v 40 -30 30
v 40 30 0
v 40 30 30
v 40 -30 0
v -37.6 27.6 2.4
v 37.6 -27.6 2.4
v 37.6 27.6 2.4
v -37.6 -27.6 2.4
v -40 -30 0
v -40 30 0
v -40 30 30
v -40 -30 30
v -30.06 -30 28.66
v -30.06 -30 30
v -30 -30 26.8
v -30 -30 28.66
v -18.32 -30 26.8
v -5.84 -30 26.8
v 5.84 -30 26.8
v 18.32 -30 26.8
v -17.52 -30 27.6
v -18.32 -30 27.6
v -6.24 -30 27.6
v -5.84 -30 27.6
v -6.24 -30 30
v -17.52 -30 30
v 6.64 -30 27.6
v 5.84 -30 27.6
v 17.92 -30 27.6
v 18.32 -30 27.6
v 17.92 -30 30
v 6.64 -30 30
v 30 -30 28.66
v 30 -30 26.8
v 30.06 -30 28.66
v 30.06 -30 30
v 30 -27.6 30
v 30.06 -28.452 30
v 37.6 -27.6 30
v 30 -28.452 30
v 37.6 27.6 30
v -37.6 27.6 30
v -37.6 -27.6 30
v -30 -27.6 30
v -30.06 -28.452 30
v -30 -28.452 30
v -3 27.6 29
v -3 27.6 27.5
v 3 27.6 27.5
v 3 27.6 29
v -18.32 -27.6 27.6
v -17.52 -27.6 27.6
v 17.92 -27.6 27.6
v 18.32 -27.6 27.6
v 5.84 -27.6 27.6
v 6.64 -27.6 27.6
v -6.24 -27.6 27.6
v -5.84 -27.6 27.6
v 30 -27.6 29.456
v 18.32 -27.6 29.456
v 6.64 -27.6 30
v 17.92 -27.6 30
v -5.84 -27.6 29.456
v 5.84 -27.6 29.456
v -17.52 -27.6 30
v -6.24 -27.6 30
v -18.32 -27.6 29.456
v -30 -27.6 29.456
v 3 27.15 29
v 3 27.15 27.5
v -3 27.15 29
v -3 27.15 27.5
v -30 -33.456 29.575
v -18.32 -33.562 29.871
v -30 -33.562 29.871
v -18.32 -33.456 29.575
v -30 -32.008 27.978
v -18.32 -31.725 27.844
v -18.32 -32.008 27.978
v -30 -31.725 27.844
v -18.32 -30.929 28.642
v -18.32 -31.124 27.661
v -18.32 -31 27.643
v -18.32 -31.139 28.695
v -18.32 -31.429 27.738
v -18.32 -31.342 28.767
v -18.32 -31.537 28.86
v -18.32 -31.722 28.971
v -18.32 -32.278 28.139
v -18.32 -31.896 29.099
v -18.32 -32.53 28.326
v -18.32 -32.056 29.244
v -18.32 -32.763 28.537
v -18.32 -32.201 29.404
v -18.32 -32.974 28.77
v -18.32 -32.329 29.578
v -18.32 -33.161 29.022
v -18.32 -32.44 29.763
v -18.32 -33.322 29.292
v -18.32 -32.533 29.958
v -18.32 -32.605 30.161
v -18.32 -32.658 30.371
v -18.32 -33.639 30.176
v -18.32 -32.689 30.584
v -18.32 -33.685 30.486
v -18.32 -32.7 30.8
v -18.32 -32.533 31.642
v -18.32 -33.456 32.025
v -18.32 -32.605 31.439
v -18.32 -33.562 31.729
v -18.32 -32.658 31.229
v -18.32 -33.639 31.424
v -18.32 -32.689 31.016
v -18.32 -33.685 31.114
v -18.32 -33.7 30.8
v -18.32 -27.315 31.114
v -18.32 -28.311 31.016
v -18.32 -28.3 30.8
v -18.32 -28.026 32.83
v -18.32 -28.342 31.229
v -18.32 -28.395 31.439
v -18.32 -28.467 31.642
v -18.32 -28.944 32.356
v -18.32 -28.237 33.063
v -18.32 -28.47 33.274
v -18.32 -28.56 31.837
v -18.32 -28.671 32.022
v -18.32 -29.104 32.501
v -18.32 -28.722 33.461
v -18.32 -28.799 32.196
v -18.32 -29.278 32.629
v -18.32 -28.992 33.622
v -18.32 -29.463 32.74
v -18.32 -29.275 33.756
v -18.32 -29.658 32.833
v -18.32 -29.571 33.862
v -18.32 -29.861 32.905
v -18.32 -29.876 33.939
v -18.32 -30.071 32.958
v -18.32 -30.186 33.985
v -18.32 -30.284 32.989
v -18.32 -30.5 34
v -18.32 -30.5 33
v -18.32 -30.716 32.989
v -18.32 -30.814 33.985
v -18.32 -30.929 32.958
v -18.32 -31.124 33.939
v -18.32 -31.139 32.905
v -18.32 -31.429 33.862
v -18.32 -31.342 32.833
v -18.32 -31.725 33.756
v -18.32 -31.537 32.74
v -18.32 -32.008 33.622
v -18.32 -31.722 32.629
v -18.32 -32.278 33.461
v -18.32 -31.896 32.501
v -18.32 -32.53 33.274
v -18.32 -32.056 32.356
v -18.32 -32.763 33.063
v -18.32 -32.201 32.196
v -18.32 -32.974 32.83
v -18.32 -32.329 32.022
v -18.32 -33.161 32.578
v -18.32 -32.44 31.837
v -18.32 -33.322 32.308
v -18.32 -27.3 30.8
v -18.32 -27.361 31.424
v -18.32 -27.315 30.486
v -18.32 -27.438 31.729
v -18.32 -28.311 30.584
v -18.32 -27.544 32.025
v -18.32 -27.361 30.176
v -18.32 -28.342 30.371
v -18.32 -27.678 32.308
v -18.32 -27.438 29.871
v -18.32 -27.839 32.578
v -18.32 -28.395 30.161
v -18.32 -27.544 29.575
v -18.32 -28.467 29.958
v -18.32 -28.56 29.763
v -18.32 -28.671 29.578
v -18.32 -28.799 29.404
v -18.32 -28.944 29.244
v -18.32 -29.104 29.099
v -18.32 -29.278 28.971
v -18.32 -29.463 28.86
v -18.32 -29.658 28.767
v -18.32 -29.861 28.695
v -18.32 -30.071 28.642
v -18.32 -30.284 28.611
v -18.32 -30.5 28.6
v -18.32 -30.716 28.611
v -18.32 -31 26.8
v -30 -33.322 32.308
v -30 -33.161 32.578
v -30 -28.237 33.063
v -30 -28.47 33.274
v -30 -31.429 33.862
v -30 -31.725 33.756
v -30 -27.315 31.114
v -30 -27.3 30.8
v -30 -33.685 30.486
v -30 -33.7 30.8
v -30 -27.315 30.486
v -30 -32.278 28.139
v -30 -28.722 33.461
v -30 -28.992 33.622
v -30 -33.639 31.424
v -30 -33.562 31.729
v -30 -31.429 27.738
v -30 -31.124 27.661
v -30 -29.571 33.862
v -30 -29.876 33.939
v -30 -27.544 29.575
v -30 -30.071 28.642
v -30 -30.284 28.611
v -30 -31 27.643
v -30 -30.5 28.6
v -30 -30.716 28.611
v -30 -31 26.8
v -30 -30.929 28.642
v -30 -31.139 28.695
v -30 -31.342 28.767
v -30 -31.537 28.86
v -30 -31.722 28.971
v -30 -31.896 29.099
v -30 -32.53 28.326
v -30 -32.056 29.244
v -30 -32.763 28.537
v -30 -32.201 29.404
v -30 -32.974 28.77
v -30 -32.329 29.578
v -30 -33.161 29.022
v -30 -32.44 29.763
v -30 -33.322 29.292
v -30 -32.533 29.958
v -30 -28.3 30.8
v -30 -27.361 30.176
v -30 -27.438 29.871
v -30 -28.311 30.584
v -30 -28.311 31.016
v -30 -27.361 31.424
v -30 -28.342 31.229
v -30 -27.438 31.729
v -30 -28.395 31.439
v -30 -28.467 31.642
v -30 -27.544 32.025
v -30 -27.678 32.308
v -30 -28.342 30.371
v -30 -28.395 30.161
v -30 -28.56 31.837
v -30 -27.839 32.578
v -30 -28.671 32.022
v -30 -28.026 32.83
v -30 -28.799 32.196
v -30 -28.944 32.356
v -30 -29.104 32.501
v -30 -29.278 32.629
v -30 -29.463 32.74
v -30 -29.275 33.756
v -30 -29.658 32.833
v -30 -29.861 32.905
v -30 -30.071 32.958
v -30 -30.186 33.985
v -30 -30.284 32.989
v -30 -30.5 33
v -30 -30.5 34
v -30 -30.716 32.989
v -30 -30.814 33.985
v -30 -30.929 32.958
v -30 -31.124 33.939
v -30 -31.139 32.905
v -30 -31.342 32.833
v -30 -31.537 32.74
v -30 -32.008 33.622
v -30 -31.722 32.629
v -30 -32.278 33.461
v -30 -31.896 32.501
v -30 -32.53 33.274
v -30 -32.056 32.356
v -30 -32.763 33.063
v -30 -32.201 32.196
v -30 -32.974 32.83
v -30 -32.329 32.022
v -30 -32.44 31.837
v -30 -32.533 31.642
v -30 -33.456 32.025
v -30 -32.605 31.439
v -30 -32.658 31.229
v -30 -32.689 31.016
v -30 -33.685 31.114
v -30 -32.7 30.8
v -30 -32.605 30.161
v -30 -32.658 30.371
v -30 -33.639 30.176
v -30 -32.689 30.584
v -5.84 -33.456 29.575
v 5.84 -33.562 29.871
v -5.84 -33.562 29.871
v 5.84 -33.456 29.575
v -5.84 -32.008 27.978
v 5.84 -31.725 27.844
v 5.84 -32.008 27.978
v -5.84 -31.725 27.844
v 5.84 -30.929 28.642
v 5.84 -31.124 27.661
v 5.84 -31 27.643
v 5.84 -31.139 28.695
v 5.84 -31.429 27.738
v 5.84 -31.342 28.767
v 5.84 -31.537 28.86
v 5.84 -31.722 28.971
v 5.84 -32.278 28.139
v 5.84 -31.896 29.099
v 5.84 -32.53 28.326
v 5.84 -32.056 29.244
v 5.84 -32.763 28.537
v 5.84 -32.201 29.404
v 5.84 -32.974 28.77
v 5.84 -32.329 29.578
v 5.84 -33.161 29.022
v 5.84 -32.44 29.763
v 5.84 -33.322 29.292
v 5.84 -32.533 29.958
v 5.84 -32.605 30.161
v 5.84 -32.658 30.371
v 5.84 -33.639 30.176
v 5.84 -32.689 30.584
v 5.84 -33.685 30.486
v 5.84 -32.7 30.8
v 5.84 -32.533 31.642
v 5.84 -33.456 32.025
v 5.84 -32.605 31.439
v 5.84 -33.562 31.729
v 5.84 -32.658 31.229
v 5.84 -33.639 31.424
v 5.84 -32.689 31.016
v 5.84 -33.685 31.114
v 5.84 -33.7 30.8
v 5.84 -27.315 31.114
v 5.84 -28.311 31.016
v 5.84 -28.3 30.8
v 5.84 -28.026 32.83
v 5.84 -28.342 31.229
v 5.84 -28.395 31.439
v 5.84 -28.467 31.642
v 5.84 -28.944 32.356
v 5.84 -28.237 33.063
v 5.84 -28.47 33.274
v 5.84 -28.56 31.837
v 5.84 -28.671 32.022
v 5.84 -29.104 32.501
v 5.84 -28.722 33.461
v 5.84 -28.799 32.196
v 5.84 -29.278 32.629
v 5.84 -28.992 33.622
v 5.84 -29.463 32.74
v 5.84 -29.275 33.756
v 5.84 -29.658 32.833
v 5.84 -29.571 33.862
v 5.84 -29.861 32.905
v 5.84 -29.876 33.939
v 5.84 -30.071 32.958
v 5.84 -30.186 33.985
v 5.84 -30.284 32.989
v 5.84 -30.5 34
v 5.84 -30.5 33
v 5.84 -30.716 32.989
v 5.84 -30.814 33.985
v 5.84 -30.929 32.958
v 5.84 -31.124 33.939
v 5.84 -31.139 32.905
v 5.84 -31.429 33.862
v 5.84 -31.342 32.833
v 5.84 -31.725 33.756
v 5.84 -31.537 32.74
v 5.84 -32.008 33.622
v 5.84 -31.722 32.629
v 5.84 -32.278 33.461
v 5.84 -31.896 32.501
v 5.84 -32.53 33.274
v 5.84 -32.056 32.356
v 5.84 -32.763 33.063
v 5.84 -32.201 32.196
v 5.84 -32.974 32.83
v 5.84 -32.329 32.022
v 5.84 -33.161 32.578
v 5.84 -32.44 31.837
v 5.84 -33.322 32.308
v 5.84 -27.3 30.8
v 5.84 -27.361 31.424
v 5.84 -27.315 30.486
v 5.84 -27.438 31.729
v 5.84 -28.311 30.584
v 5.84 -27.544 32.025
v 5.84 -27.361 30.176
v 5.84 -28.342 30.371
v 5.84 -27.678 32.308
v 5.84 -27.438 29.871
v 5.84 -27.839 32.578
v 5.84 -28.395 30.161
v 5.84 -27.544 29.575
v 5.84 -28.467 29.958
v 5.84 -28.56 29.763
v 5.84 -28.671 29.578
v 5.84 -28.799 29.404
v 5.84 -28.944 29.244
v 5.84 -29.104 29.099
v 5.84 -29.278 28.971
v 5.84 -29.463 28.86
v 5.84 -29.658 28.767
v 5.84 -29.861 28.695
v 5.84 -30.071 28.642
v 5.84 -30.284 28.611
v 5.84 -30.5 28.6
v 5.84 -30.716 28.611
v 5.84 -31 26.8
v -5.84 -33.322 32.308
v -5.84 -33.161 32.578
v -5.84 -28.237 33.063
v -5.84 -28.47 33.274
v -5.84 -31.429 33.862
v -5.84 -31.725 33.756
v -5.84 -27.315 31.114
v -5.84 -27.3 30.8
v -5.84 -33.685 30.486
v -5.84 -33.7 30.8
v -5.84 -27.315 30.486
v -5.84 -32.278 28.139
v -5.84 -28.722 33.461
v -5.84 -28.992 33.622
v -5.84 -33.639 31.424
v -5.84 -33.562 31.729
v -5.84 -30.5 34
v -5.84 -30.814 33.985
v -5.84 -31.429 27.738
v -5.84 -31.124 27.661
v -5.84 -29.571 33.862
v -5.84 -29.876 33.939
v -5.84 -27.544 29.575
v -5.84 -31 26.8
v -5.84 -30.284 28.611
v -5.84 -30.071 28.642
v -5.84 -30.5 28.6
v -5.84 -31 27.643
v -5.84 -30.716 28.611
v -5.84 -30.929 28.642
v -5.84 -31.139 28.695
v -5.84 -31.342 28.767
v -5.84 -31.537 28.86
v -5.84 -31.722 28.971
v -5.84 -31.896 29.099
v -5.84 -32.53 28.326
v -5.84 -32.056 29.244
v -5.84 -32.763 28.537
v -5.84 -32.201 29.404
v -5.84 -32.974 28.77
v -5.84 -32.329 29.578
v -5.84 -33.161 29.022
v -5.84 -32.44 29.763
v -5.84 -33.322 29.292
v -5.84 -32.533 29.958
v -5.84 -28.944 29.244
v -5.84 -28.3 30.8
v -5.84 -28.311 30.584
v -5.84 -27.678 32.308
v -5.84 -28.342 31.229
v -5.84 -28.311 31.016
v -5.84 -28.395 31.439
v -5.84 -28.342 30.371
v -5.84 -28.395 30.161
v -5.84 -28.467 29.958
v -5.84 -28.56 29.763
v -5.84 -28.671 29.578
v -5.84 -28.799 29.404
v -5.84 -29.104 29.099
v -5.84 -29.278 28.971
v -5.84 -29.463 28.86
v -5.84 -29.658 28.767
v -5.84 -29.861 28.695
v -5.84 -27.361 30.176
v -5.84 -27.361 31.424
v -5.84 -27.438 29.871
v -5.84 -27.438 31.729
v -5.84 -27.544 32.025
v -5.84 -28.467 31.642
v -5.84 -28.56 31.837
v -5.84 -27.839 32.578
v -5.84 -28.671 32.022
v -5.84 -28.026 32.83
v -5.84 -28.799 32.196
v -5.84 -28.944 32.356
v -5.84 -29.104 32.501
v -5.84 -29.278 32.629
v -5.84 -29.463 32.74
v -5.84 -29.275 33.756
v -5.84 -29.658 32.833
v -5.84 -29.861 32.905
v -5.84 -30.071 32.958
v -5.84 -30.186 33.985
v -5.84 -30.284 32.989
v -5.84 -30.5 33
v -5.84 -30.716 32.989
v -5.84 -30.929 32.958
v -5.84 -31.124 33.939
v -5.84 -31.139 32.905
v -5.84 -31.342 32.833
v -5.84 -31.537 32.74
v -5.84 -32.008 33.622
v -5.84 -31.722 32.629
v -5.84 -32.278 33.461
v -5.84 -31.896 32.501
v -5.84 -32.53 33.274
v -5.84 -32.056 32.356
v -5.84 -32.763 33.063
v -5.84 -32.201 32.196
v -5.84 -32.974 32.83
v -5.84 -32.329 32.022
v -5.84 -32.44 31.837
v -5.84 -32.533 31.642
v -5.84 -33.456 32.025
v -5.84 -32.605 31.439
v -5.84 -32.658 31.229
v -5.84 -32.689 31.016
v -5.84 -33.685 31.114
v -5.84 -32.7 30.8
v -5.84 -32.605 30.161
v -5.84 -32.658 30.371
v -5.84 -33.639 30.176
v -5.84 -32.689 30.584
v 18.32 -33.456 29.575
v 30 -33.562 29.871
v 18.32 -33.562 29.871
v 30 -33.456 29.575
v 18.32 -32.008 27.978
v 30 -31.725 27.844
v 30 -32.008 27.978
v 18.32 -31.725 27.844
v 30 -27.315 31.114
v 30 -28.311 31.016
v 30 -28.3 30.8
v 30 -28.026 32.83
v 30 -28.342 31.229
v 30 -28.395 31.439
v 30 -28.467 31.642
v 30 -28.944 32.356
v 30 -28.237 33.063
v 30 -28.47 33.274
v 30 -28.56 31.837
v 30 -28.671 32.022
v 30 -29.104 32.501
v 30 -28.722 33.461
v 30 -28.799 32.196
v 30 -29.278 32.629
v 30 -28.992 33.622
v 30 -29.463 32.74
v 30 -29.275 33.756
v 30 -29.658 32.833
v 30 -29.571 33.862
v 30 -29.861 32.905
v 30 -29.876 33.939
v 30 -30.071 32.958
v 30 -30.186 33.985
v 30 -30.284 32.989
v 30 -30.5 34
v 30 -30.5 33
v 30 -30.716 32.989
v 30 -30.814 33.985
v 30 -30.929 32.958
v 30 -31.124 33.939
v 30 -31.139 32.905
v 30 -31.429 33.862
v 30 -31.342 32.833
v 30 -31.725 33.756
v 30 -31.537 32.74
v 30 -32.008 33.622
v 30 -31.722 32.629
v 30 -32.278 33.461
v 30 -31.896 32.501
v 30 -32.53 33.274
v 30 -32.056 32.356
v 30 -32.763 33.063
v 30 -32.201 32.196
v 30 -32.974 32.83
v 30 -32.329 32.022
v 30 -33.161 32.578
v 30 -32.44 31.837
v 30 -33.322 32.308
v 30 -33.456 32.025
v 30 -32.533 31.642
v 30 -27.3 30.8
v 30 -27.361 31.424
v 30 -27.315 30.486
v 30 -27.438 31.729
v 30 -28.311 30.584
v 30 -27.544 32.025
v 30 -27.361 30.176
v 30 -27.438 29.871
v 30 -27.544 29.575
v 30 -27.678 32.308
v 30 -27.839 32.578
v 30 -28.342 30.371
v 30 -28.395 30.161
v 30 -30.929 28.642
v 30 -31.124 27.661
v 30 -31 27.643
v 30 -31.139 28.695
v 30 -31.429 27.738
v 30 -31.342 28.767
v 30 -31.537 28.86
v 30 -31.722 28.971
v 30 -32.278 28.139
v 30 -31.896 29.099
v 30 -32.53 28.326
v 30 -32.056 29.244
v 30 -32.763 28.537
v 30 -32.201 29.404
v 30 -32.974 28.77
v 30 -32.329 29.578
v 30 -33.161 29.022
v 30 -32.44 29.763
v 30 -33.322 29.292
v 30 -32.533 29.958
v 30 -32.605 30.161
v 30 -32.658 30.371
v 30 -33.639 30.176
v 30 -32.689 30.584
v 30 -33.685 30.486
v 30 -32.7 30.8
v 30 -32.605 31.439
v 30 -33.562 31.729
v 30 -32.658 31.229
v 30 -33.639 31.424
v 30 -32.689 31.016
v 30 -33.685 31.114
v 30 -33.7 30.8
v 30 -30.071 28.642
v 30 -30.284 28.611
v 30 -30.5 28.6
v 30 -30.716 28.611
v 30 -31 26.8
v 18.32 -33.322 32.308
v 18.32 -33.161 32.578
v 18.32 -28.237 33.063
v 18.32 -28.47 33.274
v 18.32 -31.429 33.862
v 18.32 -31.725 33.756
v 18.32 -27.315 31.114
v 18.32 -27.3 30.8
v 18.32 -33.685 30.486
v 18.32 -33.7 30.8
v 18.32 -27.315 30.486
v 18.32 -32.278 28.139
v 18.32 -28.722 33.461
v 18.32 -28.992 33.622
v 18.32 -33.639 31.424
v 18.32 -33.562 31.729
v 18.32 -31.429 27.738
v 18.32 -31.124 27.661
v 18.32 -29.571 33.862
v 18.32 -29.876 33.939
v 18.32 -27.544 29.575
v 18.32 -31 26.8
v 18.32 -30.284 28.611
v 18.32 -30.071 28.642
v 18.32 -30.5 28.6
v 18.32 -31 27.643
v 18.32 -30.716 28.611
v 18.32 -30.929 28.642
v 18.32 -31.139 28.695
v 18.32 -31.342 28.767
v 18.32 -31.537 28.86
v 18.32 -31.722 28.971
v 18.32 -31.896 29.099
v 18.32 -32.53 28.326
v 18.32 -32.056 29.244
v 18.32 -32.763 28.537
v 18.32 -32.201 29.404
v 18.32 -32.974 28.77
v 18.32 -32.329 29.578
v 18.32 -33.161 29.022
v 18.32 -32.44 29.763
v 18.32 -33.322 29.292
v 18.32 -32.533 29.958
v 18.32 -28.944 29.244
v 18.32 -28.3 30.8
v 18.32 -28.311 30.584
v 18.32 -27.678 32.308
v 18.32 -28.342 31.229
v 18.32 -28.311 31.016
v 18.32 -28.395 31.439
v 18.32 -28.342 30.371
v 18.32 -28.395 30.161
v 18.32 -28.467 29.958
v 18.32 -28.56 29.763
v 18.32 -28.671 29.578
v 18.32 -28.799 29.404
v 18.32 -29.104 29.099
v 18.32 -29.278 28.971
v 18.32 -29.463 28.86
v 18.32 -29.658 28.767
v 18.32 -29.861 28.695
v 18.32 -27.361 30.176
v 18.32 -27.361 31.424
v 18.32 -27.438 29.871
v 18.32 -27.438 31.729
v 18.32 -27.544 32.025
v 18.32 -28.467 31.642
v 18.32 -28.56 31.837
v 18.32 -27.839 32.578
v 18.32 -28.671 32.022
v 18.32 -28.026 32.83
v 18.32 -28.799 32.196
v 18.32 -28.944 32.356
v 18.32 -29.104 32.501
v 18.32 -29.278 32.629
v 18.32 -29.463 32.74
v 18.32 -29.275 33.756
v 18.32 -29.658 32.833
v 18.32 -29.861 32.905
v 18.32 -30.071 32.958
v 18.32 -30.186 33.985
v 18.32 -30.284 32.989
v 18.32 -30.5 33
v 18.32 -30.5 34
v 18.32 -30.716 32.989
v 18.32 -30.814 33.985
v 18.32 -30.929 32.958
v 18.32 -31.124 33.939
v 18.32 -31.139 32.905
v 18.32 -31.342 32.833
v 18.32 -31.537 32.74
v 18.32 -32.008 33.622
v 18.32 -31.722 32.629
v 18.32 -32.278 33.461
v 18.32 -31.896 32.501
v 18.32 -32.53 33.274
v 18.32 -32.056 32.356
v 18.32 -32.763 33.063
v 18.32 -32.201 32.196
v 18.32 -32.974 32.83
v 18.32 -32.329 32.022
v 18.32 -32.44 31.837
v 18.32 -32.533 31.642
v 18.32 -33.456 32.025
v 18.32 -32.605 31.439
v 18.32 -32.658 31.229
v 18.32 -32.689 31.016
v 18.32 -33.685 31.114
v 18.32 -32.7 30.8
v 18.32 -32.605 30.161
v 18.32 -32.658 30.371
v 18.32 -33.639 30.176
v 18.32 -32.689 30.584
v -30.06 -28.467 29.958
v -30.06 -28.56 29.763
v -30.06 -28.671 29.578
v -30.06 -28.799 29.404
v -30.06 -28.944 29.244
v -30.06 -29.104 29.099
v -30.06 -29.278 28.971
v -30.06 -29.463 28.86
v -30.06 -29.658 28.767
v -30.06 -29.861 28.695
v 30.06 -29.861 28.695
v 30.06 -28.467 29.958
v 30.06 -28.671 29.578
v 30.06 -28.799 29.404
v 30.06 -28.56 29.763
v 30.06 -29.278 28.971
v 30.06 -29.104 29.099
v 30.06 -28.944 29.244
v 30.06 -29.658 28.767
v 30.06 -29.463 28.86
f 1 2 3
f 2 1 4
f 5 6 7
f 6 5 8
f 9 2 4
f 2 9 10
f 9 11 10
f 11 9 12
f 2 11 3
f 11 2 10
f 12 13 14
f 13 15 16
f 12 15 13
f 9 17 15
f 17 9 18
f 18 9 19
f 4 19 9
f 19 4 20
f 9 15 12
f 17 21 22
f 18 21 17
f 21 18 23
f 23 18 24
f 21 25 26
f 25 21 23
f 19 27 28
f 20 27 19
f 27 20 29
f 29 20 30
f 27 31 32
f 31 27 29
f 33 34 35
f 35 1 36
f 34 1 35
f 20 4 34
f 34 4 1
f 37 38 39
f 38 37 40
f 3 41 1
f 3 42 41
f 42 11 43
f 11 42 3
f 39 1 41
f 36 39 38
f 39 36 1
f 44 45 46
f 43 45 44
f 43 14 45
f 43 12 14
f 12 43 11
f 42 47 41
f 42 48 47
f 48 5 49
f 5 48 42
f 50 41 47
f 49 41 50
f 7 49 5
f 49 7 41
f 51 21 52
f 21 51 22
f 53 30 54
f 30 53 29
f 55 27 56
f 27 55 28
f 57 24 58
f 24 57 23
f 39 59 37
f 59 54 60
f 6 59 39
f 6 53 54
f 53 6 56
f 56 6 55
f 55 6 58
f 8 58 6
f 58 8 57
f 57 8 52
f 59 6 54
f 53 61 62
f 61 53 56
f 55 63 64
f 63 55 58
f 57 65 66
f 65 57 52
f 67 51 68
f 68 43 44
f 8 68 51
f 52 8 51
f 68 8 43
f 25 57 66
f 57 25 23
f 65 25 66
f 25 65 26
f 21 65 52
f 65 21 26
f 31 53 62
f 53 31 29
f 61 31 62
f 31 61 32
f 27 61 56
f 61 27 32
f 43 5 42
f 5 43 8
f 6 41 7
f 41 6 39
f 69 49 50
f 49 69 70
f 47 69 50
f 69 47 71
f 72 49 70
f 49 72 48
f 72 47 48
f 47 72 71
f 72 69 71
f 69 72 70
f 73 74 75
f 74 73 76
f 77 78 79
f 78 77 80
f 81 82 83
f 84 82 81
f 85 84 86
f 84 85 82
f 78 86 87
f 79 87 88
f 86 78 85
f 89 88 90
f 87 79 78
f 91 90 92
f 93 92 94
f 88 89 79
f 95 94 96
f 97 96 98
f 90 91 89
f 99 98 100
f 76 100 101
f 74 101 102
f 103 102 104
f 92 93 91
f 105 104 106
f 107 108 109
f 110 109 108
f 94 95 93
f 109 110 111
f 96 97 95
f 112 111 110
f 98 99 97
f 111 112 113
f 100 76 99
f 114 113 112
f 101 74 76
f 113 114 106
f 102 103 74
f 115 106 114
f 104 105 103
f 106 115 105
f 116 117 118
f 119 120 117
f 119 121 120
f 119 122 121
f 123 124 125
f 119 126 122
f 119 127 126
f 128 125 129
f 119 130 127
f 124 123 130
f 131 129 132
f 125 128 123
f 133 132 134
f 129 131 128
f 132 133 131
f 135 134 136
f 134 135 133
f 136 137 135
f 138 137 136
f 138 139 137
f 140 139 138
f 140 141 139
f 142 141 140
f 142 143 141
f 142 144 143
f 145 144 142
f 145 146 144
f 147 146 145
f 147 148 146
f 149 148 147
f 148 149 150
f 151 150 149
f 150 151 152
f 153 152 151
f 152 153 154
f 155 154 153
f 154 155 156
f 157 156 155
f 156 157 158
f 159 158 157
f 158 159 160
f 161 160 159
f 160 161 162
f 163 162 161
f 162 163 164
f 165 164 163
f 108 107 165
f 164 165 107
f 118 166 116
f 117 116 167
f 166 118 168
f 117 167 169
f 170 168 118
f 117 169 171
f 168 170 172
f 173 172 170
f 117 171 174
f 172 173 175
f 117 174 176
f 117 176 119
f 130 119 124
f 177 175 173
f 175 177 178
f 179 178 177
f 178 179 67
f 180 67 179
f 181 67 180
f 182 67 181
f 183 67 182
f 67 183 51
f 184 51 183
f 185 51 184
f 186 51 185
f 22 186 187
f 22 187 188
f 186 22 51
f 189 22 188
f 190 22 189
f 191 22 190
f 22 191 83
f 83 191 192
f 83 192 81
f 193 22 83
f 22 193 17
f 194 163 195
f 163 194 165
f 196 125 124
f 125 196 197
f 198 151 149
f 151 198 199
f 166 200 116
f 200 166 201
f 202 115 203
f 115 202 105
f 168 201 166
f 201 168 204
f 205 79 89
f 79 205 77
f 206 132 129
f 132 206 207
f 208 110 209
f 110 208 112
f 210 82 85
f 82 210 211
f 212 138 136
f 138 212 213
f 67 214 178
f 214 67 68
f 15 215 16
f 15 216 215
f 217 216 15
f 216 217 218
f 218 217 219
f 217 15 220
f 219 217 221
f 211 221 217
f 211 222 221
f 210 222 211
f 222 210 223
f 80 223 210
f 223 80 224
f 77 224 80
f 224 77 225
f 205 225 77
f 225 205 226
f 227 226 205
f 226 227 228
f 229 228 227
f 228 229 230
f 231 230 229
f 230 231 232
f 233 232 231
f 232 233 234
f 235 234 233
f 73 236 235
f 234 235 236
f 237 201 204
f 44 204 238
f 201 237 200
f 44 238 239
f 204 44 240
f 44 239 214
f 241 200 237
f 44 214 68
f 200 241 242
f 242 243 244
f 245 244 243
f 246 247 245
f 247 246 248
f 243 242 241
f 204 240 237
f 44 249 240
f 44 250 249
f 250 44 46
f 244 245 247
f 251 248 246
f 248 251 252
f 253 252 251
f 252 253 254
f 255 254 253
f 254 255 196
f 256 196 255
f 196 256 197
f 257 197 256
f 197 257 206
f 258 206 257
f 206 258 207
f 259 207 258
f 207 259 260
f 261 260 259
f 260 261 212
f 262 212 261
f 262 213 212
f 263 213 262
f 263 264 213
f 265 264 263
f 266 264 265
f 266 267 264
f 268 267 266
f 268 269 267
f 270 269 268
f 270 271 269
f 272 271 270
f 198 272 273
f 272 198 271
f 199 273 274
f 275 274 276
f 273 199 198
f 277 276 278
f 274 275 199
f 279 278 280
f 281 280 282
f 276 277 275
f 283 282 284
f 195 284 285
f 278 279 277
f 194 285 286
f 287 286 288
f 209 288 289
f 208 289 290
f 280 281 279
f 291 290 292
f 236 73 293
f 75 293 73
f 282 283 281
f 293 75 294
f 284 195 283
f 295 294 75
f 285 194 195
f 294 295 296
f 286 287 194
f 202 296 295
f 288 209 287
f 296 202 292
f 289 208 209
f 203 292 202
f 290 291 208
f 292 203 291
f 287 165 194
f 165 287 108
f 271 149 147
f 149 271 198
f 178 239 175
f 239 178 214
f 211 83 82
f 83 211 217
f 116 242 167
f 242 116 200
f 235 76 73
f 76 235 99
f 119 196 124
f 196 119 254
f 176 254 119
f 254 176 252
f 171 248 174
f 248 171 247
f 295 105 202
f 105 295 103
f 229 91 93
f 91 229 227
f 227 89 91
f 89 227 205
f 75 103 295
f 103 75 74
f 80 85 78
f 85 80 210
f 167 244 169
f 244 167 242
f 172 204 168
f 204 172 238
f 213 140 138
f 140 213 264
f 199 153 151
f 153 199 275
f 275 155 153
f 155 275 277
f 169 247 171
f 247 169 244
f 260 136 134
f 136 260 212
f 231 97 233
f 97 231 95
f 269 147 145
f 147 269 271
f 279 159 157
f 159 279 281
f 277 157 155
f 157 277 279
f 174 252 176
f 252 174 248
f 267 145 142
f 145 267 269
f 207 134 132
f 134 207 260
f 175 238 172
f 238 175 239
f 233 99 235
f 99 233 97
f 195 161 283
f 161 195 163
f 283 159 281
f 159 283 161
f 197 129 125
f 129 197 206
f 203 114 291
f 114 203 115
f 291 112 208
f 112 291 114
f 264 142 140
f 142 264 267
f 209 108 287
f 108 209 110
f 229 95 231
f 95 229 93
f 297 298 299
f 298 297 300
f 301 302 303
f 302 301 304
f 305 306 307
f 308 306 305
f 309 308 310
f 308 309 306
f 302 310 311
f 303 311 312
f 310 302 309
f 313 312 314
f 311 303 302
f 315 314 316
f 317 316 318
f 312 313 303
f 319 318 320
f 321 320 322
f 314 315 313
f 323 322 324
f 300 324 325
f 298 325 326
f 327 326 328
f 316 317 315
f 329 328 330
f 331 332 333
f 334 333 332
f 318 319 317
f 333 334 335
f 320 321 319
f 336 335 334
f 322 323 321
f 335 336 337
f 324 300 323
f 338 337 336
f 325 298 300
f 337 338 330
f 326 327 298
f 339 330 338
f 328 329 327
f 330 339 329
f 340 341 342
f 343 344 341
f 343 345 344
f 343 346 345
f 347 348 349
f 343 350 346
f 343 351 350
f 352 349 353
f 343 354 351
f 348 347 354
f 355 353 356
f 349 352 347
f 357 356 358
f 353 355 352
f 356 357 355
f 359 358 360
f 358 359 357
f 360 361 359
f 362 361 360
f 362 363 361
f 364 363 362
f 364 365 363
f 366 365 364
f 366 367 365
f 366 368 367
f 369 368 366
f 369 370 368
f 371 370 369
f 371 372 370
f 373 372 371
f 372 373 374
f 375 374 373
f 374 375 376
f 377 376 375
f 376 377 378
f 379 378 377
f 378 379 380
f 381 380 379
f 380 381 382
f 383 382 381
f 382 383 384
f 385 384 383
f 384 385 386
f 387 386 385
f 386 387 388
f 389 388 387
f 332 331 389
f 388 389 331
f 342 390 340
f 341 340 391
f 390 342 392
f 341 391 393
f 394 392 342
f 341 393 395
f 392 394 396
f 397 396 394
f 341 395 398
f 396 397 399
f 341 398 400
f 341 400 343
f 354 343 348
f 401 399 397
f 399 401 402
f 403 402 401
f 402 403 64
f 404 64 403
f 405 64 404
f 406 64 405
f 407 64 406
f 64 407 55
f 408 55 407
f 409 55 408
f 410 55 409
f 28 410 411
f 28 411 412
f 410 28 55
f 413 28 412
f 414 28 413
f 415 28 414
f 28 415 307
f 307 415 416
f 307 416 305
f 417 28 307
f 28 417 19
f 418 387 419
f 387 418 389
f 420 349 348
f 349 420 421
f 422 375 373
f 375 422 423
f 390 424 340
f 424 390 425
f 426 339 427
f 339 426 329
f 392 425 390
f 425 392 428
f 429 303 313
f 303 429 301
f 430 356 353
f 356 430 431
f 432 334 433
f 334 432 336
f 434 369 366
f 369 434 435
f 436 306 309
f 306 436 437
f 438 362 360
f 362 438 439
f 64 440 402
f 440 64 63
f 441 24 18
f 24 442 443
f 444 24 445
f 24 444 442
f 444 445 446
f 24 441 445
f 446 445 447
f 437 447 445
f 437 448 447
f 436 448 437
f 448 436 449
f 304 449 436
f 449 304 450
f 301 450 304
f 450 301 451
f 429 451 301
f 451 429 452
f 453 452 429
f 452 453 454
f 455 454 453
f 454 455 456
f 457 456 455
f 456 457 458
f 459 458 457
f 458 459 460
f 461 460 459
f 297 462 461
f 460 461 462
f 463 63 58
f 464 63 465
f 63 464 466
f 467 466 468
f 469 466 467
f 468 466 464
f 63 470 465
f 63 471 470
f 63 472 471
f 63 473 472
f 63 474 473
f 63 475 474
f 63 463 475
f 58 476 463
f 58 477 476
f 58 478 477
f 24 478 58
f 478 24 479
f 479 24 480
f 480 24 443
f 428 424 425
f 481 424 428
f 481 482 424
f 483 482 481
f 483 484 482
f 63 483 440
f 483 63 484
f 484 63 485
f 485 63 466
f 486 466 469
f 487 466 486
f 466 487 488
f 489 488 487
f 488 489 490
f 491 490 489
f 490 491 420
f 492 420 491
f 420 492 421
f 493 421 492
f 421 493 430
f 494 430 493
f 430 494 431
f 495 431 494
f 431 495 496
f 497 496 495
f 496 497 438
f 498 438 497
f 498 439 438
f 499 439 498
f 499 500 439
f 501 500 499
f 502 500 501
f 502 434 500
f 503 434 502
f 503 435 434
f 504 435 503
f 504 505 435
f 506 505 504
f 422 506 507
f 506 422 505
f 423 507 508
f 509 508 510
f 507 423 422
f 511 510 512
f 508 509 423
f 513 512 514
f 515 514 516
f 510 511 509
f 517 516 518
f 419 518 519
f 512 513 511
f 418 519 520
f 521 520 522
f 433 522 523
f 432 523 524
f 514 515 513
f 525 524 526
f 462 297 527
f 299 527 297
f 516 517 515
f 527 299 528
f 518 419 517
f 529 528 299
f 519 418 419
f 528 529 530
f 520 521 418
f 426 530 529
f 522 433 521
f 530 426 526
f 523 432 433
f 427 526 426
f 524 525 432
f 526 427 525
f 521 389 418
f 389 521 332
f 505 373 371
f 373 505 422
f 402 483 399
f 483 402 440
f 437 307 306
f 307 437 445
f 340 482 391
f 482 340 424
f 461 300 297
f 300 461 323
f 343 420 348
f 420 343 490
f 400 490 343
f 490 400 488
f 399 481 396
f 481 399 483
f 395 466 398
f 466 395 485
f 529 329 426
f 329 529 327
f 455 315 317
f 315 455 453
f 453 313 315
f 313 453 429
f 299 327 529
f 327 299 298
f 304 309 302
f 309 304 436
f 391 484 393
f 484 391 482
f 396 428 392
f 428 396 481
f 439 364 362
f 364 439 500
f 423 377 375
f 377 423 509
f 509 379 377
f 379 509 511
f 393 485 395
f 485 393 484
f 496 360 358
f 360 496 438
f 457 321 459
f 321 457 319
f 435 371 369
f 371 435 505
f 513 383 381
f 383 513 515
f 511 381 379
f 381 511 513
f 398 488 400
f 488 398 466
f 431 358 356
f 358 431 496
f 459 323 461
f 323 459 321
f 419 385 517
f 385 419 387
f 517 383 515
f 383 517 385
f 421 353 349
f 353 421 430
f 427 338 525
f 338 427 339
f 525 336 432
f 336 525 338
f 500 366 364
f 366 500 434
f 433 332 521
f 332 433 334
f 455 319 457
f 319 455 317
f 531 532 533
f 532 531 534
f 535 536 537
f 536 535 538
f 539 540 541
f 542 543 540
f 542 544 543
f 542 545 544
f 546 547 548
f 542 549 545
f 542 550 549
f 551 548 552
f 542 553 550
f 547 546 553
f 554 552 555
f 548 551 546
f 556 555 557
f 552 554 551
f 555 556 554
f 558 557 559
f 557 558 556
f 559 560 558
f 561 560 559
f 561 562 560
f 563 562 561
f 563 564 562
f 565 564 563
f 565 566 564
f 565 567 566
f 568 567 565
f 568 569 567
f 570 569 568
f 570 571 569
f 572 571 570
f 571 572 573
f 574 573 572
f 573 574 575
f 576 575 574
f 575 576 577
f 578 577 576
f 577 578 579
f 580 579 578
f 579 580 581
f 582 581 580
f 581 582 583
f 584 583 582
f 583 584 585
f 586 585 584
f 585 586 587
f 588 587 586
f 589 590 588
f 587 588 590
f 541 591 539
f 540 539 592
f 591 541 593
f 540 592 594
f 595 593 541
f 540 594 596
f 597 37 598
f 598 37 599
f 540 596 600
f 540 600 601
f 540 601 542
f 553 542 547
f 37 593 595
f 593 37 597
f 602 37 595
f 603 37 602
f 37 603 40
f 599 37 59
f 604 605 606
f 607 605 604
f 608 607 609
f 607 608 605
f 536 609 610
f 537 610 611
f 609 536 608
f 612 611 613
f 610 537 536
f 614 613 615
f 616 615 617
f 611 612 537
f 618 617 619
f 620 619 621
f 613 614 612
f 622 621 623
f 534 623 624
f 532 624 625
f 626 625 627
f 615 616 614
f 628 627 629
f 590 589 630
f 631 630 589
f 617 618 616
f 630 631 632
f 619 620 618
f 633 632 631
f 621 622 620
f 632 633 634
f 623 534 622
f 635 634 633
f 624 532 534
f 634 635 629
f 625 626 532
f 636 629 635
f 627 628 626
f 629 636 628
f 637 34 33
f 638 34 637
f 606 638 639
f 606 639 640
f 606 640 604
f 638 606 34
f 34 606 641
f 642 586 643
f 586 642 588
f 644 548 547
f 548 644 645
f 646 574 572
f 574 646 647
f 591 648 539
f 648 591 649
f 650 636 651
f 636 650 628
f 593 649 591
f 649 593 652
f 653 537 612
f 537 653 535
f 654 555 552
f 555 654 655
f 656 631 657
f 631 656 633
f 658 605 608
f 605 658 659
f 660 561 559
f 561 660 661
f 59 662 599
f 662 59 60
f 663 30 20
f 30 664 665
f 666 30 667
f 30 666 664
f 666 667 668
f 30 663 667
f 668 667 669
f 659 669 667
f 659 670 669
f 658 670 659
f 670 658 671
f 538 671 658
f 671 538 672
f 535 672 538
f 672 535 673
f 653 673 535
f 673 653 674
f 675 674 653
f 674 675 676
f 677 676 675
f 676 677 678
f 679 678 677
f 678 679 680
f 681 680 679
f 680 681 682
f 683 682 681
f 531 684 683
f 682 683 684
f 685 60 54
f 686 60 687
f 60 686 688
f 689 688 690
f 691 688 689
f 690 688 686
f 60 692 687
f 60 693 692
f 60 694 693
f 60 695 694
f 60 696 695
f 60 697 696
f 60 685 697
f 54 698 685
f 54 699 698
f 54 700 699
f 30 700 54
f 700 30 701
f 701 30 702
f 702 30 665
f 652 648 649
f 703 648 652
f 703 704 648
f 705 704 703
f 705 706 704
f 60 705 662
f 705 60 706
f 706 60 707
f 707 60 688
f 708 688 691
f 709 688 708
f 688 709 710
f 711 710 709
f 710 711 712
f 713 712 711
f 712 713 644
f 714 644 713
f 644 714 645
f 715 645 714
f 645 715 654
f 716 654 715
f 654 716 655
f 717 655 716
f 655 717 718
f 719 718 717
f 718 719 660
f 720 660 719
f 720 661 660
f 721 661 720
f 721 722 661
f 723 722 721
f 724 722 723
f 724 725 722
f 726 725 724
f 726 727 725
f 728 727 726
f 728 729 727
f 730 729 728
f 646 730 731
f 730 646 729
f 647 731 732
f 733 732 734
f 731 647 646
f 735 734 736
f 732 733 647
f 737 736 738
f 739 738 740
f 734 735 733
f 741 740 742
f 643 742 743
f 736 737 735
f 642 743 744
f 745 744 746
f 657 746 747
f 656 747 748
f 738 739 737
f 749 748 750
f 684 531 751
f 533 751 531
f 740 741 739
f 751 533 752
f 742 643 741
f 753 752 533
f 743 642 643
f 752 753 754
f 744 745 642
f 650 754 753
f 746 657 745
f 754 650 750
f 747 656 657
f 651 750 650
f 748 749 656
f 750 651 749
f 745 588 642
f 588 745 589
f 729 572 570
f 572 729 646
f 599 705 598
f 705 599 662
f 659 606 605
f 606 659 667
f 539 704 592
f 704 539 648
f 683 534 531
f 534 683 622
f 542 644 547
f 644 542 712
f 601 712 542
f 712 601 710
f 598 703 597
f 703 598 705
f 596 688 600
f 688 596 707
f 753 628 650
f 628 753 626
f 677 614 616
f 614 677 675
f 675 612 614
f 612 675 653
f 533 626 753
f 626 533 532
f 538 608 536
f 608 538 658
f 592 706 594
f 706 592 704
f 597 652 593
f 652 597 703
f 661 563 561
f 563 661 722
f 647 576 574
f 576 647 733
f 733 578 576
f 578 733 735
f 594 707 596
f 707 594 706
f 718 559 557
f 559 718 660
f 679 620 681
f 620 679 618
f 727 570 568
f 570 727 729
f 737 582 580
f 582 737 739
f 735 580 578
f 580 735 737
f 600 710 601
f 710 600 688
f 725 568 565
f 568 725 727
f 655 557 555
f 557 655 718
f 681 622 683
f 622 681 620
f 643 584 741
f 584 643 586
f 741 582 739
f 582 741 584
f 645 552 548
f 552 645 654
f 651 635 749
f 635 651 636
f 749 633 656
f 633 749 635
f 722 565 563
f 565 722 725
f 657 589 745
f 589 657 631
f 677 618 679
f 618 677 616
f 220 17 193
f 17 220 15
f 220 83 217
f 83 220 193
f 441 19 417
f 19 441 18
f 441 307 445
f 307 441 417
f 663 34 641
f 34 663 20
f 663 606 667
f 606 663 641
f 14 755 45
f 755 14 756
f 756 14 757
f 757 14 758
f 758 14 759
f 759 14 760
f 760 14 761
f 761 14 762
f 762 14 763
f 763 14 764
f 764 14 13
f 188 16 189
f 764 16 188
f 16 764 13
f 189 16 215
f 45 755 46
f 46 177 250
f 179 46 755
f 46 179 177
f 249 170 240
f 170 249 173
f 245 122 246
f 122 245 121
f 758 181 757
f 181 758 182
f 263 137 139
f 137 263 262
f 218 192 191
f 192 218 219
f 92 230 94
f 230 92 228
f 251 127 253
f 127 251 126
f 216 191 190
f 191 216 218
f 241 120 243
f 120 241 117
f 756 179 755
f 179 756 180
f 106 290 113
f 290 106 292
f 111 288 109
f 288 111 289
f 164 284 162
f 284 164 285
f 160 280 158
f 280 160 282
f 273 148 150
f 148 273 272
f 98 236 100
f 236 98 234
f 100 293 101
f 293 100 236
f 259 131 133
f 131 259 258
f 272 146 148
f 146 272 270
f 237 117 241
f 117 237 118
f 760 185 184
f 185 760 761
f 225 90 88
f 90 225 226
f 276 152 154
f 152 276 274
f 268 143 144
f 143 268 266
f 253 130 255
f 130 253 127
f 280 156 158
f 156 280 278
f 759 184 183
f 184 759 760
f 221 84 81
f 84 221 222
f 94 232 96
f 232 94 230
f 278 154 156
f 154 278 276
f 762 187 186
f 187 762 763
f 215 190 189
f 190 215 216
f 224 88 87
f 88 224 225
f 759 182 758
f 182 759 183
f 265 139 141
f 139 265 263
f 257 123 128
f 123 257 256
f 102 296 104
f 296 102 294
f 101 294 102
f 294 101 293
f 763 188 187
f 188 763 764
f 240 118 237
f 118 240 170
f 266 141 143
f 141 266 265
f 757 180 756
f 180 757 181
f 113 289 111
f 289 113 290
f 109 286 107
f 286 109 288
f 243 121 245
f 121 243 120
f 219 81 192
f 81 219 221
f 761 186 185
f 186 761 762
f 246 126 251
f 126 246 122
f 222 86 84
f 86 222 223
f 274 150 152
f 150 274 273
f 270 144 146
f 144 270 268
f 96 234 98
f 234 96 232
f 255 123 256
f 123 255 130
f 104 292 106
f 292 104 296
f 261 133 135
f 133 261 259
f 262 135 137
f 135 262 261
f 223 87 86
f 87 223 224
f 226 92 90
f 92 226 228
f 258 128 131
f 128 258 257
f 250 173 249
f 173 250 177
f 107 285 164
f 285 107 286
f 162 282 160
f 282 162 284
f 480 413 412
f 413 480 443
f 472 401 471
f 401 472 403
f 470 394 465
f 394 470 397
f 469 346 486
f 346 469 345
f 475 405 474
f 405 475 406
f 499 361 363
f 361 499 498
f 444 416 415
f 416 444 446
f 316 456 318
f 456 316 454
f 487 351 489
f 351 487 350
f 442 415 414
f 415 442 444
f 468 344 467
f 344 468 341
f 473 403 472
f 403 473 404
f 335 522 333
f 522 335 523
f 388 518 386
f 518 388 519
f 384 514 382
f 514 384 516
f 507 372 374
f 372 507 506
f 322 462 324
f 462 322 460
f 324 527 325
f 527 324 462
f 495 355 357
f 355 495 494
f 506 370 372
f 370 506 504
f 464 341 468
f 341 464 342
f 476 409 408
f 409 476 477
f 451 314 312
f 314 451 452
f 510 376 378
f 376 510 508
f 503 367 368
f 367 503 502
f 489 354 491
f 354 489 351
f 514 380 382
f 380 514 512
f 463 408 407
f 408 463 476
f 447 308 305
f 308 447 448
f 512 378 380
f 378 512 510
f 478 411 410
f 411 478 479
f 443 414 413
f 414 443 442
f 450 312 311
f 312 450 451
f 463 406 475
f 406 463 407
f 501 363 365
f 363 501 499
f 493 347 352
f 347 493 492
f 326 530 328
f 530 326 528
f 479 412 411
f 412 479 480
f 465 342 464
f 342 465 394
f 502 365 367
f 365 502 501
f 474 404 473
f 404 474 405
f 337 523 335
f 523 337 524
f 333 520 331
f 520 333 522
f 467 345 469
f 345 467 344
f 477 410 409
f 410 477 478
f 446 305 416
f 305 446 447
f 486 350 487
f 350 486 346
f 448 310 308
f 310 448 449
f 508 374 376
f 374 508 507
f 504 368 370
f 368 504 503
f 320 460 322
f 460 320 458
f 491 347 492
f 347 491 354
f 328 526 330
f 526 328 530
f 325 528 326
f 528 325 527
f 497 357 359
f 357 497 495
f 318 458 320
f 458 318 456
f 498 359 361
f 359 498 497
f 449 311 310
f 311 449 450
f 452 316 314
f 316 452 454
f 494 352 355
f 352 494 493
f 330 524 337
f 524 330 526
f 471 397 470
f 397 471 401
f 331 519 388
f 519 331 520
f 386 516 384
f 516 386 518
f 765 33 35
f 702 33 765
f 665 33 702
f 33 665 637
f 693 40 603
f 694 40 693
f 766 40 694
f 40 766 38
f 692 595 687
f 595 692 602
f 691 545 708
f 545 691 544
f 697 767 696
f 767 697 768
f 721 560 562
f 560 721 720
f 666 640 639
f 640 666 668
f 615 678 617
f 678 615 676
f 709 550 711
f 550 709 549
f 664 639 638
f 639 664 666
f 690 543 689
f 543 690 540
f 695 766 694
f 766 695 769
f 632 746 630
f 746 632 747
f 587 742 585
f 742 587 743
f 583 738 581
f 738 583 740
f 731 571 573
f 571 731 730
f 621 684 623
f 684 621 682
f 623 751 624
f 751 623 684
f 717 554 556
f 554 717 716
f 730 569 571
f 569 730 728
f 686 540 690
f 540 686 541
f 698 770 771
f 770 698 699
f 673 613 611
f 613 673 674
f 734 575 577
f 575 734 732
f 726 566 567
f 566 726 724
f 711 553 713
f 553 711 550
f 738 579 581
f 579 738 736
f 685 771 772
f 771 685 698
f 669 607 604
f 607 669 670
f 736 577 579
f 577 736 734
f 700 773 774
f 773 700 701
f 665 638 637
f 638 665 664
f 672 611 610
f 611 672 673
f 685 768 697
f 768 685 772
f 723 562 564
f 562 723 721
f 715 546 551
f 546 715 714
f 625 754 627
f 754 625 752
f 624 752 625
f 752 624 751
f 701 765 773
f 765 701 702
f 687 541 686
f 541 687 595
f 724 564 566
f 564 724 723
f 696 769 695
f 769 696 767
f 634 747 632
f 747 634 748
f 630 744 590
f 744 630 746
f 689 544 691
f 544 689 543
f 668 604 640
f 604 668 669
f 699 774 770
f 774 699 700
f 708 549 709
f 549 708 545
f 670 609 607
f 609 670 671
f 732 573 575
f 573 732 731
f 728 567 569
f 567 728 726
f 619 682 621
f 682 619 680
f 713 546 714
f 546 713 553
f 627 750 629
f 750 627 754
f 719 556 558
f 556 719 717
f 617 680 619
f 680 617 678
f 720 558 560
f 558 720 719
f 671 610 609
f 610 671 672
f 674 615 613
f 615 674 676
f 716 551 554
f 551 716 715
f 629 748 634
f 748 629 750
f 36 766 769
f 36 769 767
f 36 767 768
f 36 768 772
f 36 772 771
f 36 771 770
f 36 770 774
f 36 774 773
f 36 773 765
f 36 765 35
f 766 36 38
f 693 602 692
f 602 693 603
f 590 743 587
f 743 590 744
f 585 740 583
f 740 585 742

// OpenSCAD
// Box with print-in-place hinge (v4: bridge webs to kill band overhangs)
part = "box";
// [box, lid, pin, assembly]
cadverify_only = "";
module instance(name, part, unit = 1) {
    echo(cadverify_instance = [name, part, unit]);
    if (cadverify_only == "" || cadverify_only == name) children();
}

Rkn = 3.2; rbore = 2.2; rpin = 1.9;
yh = -30.5; zh = 30.8;
lid_zh = 3.4;
lid_lift = 27.4;
pin_lift_z = 27.8; pin_shift_y = -30.5;
k0x0=-30; k0x1=-18.32;
k1x0=-17.92; k1x1=-6.24;
k2x0=-5.84; k2x1=5.84;
k3x0=6.24; k3x1=17.92;
k4x0=18.32; k4x1=30;

$fn = 64;

module xcyl(x0, x1, r, y, z) {
    translate([x0, y, z]) rotate([0, 90, 0]) cylinder(r = r, h = x1 - x0);
}

module box_part() {
    difference() {
        union() {
            translate([-40, -30, 0]) cube([80, 60, 2.4]);
            translate([-40, 27.6, 2.4]) cube([80, 2.4, 27.6]);
            translate([-40, -30, 2.4]) cube([80, 2.4, 27.6 - 2.4]);
            // top band of back wall split into segs clearing lid knuckles axially (0.4 gap each side)
            translate([-40, -30, 27.0]) cube([11.88, 2.4, 3.0]);
            translate([-17.52, -30, 27.0]) cube([11.28, 2.4, 3.0]);
            translate([6.64, -30, 27.0]) cube([11.28, 2.4, 3.0]);
            translate([28.12, -30, 27.0]) cube([11.88, 2.4, 3.0]);
            translate([-40, -27.6, 2.4]) cube([2.4, 55.2, 27.6]);
            translate([37.6, -27.6, 2.4]) cube([2.4, 55.2, 27.6]);
            translate([-3, 27.15, 27.5]) cube([6, 0.45, 1.5]);
            // hinge knuckles + support webs tying them to the back wall
            xcyl(k0x0, k0x1, Rkn, yh, zh);
            xcyl(k2x0, k2x1, Rkn, yh, zh);
            xcyl(k4x0, k4x1, Rkn, yh, zh);
            translate([k0x0, -31, 26.8]) cube([k0x1-k0x0, 3.4, 4.0]);
            translate([k2x0, -31, 26.8]) cube([k2x1-k2x0, 3.4, 4.0]);
            translate([k4x0, -31, 26.8]) cube([k4x1-k4x0, 3.4, 4.0]);
        }
        xcyl(k0x0-0.06, k0x1+0.06, rbore, yh, zh);
        xcyl(k2x0-0.06, k2x1+0.06, rbore, yh, zh);
        xcyl(k4x0-0.06, k4x1+0.06, rbore, yh, zh);
    }
}

module lid_part() {
    difference() {
        union() {
            translate([-40, -30, 10.6]) cube([80, 60, 2.4]);
            translate([-40, 27.6, 3]) cube([80, 2.4, 7.6]);
            translate([-17.92, -30, 3]) cube([11.68, 2.4, 7.6]);
            translate([6.24, -30, 3]) cube([11.68, 2.4, 7.6]);
            translate([-40, -30, 3]) cube([9.6, 2.4, 7.6]);
            translate([-5.44, -30, 3]) cube([10.88, 2.4, 7.6]);
            translate([18.72, -30, 3]) cube([10.88, 2.4, 7.6]);
            translate([30.4, -30, 3]) cube([9.6, 2.4, 7.6]);
            translate([-40, -27.6, 3]) cube([2.4, 55.2, 7.6]);
            translate([37.6, -27.6, 3]) cube([2.4, 55.2, 7.6]);
            translate([-37.2, 25.2, 0]) cube([74.4, 2.0, 10.6]);
            translate([-37.2, -27.2, 0]) cube([74.4, 2.0, 10.6]);
            translate([-37.2, -25.2, 0]) cube([2.0, 50.4, 10.6]);
            translate([35.2, -25.2, 0]) cube([2.0, 50.4, 10.6]);
            xcyl(k1x0, k1x1, Rkn, yh, lid_zh);
            xcyl(k3x0, k3x1, Rkn, yh, lid_zh);
            translate([k1x0, -31, 0]) cube([k1x1-k1x0, 3.4, 5]);
            translate([k3x0, -31, 0]) cube([k3x1-k3x0, 3.4, 5]);
        }
        xcyl(k1x0-0.06, k1x1+0.06, rbore, yh, lid_zh);
        xcyl(k3x0-0.06, k3x1+0.06, rbore, yh, lid_zh);
        translate([-3.25, 26.5, -0.05]) cube([6.5, 1.35, 2.05]);
    }
}

module pin_part() {
    union() {
        xcyl(-32.4, 32.4, rpin, 0, 3);
        xcyl(30.4, 32.4, 3, 0, 3);
        xcyl(-32.4, -30.4, 3, 0, 3);
    }
}

if (part == "box") {
    echo(cadverify_spec = [
        ["bounds", [[-40, -33.7, 0], [40, 30, 34.0]]],
        ["bodies", 1],
        ["through_holes", 3],
        ["support_faces", [["bed", "-z", 4000]]],
        ["overhangs_allowed", [["hinge knuckles, bores and wall cutouts print in place", [[-30.2, -33.9, 26.5], [30.2, -27.1, 33.5]]], ["catch bump underside, tiny 3.6 mm2 ledge", [[-3.2, 26.8, 27.3], [3.2, 27.8, 27.7]]]]],
        ["copies", 1],
        ["details", [
            ["floor", "thickness", [0, 0, -1], [0, 0, 1], 2.4],
            ["front_wall", "thickness", [0, 31, 15], [0, -1, 0], 2.4],
            ["cavity", "void", [[-37.6, -27.6, 2.4], [37.6, 27.6, 29.9]], 0.9],
            ["hinge_bore", "hole", [-31, -30.5, 30.8], [1, 0, 0], [[0, 4.4], [11.6, 4.4]]],
            ["catch_bump", "material", [[-3, 27.15, 27.5], [3, 27.6, 29.0]], 0.9],
            ["hinge_view", "view", [[-30, -34, 26.5], [30, -27, 34.5]]]
        ]]
    ]);
    box_part();
} else if (part == "lid") {
    echo(cadverify_spec = [
        ["bounds", [[-40, -33.7, 0], [40, 30, 13]]],
        ["bodies", 1],
        ["through_holes", 2],
        ["support_faces", [["bed", "-z", 300]]],
        ["overhangs_allowed", [
            ["hinge knuckles and bores print in place", [[-18.2, -33.9, 0], [18.2, -27.1, 4.2]]],
            ["lid top bridging over plug cavity", [[-37.2, -24.9, 10.1], [37.2, 25.2, 11.1]]]
        ]],
        ["copies", 1],
        ["details", [
            ["top", "thickness", [0, 0, 14], [0, 0, -1], 2.4],
            ["skirt", "thickness", [0, 31, 6], [0, -1, 0], 2.4],
            ["plug_cavity", "void", [[-35.2, -24.9, 0], [35.2, 25.2, 10.5]], 0.9],
            ["hinge_bore", "hole", [-18.6, -30.5, 3.4], [1, 0, 0], [[0, 4.4], [11.6, 4.4]]],
            ["catch_notch", "void", [[-3.25, 26.5, 0], [3.25, 27.85, 2.0]], 0.9],
            ["catch_view", "view", [[-5, 26.3, 0], [5, 28.5, 3]]]
        ]]
    ]);
    lid_part();
} else if (part == "pin") {
    echo(cadverify_spec = [
        ["bounds", [[-32.4, -3, 0], [32.4, 3, 6]]],
        ["bodies", 1],
        ["support_faces", []],
        ["overhangs_allowed", [["pin shaft underside bridges with 0.3 gap", [[-32.4, -1.9, 0], [32.4, 1.9, 1.6]]]]],
        ["copies", 1],
        ["details", [
            ["shaft", "thickness", [0, 3, 3], [0, -1, 0], 3.8],
            ["head", "material", [[30.4, -3, 0], [32.4, 3, 6]], 0.7],
            ["pin_view", "view", [[-32.4, -3, 0], [32.4, 3, 6]]]
        ]]
    ]);
    pin_part();
} else if (part == "assembly") {
    echo(cadverify_spec = [
        ["bounds", [[-40, -33.7, 0], [40, 30, 40.4]]],
        ["support_faces", [["bed", "-z", 4000]]],
        ["allowed_interferences", []],
        ["motions", [
            ["lid_open", ["lid"], "rotate", [0, -30.5, 30.8], [1, 0, 0], [0, 110], ["flex", [["lid", "box", 0.5, "catch bump clearance pass"]]]]
        ]],
        ["assembly_order", [
            [["box"], [0, 0, 0]],
            [["lid"], [0, 0, -1]],
            [["pin"], [1, 0, 0]]
        ]],
        ["print_in_place", 0.3],
        ["overhangs_allowed", [
            ["hinge undersides, pin bridge and cutouts in place", [[-33, -34, 26.5], [33, -27, 34.8]]],
            ["lid top bridging over box cavity", [[-37.2, -24.9, 37.5], [37.2, 25.2, 38.5]]],
            ["front lid skirt band over box rim, 0.4 gap flat bridge", [[-40.2, -30.2, 30.2], [40.2, 30.2, 30.6]]],
            ["lid plug bottom face over print gap, flat bridge", [[-37.4, -27.4, 27.2], [37.4, 27.4, 27.6]]],
            ["lid skirt inner ledge over box rim, flat bridge", [[-37.8, -30.2, 37.8], [37.8, 27.8, 38.2]]],
            ["notch top face over notch void, tiny bridge", [[-3.5, 26.3, 29.2], [3.5, 28.0, 29.6]]],
            ["catch bump underside, tiny 3.6 mm2 ledge", [[-3.2, 26.9, 27.3], [3.2, 27.8, 27.7]]]
        ]]
    ]);
    instance("box", "box") box_part();
    instance("lid", "lid") translate([0, 0, lid_lift]) lid_part();
    instance("pin", "pin") translate([0, pin_shift_y, pin_lift_z]) pin_part();
}
